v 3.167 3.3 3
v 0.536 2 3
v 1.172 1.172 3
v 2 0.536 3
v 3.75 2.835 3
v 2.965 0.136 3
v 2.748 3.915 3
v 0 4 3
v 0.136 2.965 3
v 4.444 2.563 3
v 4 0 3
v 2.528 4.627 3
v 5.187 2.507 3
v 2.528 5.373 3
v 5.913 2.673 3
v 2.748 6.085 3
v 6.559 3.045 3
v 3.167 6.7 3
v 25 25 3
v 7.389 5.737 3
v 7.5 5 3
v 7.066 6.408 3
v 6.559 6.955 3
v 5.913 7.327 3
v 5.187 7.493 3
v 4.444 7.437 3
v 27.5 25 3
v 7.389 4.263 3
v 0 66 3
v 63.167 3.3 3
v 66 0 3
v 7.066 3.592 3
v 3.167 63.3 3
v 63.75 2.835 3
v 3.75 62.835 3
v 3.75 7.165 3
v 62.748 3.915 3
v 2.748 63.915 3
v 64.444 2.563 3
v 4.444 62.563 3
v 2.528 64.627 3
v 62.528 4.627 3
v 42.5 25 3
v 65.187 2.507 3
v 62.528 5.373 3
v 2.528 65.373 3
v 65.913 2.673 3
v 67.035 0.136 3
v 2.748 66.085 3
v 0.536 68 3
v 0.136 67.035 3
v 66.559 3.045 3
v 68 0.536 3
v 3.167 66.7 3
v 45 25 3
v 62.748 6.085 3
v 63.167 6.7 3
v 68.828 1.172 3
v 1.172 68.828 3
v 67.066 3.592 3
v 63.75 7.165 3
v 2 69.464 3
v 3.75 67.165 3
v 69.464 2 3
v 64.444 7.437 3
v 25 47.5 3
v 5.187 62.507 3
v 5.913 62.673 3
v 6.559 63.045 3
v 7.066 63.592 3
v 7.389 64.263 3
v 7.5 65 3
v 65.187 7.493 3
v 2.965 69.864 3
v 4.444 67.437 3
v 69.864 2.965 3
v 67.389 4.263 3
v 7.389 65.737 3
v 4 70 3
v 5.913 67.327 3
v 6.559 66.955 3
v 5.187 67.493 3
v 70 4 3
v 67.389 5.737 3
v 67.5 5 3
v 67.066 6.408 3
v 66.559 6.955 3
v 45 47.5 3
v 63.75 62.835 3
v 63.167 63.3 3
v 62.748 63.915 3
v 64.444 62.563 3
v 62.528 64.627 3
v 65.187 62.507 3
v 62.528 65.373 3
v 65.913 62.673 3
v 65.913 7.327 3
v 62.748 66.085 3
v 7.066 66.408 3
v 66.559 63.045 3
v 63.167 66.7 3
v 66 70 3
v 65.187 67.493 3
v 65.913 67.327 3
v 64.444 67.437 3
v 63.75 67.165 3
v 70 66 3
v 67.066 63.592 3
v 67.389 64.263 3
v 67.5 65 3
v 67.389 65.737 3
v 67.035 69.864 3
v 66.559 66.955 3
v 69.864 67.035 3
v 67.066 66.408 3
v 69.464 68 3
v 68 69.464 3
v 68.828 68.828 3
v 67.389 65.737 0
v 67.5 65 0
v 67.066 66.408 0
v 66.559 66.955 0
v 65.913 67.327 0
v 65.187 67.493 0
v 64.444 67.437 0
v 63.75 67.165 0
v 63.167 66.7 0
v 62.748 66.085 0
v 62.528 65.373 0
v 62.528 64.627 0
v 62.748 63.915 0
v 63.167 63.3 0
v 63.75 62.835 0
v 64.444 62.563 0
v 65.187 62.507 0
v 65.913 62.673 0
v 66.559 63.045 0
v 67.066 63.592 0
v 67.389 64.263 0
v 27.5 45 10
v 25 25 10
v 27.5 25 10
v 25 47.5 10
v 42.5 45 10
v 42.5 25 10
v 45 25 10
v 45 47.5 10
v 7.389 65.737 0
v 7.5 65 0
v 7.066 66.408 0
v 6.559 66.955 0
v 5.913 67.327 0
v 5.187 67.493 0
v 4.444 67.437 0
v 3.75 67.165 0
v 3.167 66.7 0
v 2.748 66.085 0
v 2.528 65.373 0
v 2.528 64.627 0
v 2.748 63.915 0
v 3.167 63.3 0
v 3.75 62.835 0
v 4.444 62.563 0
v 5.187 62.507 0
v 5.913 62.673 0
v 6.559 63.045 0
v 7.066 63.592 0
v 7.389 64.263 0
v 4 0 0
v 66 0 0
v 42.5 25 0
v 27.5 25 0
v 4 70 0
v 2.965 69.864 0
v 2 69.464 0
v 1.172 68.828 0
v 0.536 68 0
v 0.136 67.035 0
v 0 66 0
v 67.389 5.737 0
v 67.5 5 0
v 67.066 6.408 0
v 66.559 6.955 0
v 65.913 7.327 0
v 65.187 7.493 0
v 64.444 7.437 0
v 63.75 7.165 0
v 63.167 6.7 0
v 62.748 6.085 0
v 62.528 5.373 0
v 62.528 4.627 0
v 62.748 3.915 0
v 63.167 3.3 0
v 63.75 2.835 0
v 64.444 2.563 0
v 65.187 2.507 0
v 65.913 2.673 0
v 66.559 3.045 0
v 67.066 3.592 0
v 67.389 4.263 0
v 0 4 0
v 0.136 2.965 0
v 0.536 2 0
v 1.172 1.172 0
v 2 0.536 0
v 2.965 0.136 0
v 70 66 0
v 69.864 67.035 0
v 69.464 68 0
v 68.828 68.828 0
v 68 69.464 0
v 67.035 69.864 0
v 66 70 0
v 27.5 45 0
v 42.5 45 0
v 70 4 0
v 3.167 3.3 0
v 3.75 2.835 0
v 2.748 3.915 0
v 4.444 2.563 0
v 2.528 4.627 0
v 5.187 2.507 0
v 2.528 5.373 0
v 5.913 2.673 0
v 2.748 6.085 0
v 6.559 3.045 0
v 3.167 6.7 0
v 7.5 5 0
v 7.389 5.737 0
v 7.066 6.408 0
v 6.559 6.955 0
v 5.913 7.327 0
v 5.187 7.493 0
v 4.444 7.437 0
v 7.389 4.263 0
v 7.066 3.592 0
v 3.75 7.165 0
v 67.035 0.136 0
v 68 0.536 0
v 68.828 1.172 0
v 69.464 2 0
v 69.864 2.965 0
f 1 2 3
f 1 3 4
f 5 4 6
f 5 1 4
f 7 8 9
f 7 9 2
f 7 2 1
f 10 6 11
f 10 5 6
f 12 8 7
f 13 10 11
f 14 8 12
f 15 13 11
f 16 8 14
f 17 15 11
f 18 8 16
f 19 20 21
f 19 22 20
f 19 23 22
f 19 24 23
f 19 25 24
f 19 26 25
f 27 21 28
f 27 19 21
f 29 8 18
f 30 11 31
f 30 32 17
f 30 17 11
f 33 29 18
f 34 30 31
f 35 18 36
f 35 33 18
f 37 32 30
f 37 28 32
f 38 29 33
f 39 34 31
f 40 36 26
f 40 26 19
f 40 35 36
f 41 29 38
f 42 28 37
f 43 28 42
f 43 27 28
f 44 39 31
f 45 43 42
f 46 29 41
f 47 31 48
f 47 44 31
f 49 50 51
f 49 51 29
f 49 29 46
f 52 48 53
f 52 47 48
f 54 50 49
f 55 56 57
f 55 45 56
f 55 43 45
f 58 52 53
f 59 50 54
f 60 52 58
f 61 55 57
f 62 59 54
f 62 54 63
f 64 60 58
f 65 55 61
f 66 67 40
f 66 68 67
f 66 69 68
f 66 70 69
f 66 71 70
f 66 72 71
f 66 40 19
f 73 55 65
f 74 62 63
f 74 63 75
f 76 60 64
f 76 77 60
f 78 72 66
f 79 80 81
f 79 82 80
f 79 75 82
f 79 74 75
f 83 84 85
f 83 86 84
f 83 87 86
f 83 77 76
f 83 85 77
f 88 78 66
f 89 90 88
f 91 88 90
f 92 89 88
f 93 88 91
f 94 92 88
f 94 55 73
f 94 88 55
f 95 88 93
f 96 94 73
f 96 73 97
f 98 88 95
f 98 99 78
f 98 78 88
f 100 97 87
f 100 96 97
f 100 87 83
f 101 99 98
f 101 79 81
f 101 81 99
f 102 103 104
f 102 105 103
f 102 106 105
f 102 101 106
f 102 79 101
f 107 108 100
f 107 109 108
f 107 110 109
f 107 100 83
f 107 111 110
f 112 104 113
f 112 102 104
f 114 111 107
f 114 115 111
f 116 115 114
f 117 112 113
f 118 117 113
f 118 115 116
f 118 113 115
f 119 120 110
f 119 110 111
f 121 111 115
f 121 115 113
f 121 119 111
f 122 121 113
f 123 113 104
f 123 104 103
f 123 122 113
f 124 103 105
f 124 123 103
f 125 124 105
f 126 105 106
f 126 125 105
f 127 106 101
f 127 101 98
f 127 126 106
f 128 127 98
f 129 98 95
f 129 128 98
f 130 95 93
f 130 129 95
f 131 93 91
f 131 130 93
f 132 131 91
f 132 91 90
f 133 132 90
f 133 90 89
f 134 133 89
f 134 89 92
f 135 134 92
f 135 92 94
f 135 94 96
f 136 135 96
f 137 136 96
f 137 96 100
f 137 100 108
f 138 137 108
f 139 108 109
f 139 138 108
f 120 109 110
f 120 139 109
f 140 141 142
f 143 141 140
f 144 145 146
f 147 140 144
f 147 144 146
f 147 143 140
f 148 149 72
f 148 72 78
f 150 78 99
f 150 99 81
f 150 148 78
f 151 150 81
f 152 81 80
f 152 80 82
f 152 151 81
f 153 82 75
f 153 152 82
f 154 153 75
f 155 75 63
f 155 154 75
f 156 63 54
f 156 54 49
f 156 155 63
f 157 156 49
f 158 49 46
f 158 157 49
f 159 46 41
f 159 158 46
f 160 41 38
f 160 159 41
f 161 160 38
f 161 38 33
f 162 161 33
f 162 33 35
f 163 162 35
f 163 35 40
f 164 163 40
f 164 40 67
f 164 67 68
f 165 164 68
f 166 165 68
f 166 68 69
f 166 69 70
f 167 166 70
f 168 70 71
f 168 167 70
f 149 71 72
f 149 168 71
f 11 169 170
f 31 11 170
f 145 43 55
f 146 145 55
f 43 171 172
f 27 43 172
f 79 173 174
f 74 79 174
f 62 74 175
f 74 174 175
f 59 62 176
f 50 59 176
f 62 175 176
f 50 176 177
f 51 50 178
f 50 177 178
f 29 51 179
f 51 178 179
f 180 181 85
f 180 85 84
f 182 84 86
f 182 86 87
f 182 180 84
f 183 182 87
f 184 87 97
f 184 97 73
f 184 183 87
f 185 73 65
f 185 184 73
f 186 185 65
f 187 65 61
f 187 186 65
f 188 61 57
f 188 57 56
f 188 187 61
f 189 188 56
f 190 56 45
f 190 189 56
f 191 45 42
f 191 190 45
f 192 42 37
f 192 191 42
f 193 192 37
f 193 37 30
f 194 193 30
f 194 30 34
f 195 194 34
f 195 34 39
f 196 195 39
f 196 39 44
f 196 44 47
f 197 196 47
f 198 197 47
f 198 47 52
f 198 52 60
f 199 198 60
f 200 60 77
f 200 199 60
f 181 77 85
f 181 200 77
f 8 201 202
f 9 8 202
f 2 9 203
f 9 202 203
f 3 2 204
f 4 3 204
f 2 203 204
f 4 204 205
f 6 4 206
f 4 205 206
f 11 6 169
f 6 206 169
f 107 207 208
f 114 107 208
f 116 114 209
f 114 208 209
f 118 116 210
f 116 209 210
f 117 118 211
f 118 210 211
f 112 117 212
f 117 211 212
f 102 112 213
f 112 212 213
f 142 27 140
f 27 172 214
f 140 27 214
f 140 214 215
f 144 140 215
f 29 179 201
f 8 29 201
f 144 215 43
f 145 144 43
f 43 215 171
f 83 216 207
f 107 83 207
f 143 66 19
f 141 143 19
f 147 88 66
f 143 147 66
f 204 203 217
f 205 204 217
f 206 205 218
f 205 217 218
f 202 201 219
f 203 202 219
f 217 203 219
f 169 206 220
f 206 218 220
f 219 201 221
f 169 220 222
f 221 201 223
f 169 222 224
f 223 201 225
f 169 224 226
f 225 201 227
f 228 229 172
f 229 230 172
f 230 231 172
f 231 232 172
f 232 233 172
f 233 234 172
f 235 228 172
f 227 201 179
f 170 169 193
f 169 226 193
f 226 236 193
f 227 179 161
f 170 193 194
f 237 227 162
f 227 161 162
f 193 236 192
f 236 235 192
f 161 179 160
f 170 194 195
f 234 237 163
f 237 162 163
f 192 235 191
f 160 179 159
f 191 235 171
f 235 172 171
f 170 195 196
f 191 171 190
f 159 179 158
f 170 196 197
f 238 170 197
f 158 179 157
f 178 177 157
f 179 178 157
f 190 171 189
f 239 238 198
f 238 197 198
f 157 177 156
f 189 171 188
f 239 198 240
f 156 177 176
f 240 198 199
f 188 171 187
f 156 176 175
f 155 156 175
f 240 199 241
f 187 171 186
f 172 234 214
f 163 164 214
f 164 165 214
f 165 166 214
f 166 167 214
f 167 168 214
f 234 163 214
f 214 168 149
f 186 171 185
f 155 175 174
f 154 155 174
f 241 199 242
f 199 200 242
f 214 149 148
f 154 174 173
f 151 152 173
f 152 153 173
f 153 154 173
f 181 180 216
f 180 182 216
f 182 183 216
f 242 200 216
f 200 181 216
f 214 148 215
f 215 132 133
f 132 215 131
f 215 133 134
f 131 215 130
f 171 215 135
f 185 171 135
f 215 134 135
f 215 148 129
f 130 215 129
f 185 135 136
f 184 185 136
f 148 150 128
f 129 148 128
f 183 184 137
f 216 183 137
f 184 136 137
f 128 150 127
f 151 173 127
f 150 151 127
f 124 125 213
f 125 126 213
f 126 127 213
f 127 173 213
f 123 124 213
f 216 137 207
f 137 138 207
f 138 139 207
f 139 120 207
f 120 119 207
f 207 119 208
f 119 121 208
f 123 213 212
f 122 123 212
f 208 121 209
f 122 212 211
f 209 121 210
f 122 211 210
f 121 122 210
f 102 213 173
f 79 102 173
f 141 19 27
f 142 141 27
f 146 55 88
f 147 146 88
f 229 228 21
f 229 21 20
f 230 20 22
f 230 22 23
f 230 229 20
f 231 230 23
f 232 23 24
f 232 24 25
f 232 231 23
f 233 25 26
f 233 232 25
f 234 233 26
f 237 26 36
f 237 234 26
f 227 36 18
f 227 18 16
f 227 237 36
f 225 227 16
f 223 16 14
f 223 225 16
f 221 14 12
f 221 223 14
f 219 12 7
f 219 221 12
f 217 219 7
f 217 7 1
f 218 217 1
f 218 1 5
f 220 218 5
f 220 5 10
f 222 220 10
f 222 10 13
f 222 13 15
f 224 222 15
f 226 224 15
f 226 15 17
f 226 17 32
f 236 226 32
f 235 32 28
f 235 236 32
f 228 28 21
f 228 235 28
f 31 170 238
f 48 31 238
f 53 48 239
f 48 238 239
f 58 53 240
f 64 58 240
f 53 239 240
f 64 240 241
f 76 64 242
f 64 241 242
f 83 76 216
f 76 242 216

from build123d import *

# Parameters (mm, degrees)
F0_R     = 2.5
F1_DEPTH = 3
F2_DEPTH = 10


with BuildPart() as f1:
    # F0 (on Top) → F1 (new body)
    with BuildSketch(Plane.XY):
        with BuildLine():
            ThreePointArc((0, 4), (1.171573, 1.171573), (4, 0))
            Line((4, 0), (66, 0))
            ThreePointArc((66, 0), (68.828427, 1.171573), (70, 4))
            Line((70, 4), (70, 66))
            ThreePointArc((70, 66), (68.828427, 68.828427), (66, 70))
            Line((66, 70), (4, 70))
            ThreePointArc((4, 70), (1.171573, 68.828427), (0, 66))
            Line((0, 66), (0, 4))
        make_face()
        with Locations((5, 5)):
            Circle(F0_R, mode=Mode.SUBTRACT)
        with Locations((65, 5)):
            Circle(F0_R, mode=Mode.SUBTRACT)
        with Locations((5, 65)):
            Circle(F0_R, mode=Mode.SUBTRACT)
        Polygon((45, 25), (42.5, 25), (27.5, 25), (25, 25), (25, 47.5), (45, 47.5), align=None, mode=Mode.SUBTRACT)
        with Locations((65, 65)):
            Circle(F0_R, mode=Mode.SUBTRACT)
    extrude(amount=F1_DEPTH)

    # F0 (on Top) → F2 (join)
    with BuildSketch(Plane.XY):
        Polygon((42.5, 45), (42.5, 25), (45, 25), (45, 47.5), (25, 47.5), (25, 25), (27.5, 25), (27.5, 45), align=None)
    extrude(amount=F2_DEPTH)


solid = f1.part
